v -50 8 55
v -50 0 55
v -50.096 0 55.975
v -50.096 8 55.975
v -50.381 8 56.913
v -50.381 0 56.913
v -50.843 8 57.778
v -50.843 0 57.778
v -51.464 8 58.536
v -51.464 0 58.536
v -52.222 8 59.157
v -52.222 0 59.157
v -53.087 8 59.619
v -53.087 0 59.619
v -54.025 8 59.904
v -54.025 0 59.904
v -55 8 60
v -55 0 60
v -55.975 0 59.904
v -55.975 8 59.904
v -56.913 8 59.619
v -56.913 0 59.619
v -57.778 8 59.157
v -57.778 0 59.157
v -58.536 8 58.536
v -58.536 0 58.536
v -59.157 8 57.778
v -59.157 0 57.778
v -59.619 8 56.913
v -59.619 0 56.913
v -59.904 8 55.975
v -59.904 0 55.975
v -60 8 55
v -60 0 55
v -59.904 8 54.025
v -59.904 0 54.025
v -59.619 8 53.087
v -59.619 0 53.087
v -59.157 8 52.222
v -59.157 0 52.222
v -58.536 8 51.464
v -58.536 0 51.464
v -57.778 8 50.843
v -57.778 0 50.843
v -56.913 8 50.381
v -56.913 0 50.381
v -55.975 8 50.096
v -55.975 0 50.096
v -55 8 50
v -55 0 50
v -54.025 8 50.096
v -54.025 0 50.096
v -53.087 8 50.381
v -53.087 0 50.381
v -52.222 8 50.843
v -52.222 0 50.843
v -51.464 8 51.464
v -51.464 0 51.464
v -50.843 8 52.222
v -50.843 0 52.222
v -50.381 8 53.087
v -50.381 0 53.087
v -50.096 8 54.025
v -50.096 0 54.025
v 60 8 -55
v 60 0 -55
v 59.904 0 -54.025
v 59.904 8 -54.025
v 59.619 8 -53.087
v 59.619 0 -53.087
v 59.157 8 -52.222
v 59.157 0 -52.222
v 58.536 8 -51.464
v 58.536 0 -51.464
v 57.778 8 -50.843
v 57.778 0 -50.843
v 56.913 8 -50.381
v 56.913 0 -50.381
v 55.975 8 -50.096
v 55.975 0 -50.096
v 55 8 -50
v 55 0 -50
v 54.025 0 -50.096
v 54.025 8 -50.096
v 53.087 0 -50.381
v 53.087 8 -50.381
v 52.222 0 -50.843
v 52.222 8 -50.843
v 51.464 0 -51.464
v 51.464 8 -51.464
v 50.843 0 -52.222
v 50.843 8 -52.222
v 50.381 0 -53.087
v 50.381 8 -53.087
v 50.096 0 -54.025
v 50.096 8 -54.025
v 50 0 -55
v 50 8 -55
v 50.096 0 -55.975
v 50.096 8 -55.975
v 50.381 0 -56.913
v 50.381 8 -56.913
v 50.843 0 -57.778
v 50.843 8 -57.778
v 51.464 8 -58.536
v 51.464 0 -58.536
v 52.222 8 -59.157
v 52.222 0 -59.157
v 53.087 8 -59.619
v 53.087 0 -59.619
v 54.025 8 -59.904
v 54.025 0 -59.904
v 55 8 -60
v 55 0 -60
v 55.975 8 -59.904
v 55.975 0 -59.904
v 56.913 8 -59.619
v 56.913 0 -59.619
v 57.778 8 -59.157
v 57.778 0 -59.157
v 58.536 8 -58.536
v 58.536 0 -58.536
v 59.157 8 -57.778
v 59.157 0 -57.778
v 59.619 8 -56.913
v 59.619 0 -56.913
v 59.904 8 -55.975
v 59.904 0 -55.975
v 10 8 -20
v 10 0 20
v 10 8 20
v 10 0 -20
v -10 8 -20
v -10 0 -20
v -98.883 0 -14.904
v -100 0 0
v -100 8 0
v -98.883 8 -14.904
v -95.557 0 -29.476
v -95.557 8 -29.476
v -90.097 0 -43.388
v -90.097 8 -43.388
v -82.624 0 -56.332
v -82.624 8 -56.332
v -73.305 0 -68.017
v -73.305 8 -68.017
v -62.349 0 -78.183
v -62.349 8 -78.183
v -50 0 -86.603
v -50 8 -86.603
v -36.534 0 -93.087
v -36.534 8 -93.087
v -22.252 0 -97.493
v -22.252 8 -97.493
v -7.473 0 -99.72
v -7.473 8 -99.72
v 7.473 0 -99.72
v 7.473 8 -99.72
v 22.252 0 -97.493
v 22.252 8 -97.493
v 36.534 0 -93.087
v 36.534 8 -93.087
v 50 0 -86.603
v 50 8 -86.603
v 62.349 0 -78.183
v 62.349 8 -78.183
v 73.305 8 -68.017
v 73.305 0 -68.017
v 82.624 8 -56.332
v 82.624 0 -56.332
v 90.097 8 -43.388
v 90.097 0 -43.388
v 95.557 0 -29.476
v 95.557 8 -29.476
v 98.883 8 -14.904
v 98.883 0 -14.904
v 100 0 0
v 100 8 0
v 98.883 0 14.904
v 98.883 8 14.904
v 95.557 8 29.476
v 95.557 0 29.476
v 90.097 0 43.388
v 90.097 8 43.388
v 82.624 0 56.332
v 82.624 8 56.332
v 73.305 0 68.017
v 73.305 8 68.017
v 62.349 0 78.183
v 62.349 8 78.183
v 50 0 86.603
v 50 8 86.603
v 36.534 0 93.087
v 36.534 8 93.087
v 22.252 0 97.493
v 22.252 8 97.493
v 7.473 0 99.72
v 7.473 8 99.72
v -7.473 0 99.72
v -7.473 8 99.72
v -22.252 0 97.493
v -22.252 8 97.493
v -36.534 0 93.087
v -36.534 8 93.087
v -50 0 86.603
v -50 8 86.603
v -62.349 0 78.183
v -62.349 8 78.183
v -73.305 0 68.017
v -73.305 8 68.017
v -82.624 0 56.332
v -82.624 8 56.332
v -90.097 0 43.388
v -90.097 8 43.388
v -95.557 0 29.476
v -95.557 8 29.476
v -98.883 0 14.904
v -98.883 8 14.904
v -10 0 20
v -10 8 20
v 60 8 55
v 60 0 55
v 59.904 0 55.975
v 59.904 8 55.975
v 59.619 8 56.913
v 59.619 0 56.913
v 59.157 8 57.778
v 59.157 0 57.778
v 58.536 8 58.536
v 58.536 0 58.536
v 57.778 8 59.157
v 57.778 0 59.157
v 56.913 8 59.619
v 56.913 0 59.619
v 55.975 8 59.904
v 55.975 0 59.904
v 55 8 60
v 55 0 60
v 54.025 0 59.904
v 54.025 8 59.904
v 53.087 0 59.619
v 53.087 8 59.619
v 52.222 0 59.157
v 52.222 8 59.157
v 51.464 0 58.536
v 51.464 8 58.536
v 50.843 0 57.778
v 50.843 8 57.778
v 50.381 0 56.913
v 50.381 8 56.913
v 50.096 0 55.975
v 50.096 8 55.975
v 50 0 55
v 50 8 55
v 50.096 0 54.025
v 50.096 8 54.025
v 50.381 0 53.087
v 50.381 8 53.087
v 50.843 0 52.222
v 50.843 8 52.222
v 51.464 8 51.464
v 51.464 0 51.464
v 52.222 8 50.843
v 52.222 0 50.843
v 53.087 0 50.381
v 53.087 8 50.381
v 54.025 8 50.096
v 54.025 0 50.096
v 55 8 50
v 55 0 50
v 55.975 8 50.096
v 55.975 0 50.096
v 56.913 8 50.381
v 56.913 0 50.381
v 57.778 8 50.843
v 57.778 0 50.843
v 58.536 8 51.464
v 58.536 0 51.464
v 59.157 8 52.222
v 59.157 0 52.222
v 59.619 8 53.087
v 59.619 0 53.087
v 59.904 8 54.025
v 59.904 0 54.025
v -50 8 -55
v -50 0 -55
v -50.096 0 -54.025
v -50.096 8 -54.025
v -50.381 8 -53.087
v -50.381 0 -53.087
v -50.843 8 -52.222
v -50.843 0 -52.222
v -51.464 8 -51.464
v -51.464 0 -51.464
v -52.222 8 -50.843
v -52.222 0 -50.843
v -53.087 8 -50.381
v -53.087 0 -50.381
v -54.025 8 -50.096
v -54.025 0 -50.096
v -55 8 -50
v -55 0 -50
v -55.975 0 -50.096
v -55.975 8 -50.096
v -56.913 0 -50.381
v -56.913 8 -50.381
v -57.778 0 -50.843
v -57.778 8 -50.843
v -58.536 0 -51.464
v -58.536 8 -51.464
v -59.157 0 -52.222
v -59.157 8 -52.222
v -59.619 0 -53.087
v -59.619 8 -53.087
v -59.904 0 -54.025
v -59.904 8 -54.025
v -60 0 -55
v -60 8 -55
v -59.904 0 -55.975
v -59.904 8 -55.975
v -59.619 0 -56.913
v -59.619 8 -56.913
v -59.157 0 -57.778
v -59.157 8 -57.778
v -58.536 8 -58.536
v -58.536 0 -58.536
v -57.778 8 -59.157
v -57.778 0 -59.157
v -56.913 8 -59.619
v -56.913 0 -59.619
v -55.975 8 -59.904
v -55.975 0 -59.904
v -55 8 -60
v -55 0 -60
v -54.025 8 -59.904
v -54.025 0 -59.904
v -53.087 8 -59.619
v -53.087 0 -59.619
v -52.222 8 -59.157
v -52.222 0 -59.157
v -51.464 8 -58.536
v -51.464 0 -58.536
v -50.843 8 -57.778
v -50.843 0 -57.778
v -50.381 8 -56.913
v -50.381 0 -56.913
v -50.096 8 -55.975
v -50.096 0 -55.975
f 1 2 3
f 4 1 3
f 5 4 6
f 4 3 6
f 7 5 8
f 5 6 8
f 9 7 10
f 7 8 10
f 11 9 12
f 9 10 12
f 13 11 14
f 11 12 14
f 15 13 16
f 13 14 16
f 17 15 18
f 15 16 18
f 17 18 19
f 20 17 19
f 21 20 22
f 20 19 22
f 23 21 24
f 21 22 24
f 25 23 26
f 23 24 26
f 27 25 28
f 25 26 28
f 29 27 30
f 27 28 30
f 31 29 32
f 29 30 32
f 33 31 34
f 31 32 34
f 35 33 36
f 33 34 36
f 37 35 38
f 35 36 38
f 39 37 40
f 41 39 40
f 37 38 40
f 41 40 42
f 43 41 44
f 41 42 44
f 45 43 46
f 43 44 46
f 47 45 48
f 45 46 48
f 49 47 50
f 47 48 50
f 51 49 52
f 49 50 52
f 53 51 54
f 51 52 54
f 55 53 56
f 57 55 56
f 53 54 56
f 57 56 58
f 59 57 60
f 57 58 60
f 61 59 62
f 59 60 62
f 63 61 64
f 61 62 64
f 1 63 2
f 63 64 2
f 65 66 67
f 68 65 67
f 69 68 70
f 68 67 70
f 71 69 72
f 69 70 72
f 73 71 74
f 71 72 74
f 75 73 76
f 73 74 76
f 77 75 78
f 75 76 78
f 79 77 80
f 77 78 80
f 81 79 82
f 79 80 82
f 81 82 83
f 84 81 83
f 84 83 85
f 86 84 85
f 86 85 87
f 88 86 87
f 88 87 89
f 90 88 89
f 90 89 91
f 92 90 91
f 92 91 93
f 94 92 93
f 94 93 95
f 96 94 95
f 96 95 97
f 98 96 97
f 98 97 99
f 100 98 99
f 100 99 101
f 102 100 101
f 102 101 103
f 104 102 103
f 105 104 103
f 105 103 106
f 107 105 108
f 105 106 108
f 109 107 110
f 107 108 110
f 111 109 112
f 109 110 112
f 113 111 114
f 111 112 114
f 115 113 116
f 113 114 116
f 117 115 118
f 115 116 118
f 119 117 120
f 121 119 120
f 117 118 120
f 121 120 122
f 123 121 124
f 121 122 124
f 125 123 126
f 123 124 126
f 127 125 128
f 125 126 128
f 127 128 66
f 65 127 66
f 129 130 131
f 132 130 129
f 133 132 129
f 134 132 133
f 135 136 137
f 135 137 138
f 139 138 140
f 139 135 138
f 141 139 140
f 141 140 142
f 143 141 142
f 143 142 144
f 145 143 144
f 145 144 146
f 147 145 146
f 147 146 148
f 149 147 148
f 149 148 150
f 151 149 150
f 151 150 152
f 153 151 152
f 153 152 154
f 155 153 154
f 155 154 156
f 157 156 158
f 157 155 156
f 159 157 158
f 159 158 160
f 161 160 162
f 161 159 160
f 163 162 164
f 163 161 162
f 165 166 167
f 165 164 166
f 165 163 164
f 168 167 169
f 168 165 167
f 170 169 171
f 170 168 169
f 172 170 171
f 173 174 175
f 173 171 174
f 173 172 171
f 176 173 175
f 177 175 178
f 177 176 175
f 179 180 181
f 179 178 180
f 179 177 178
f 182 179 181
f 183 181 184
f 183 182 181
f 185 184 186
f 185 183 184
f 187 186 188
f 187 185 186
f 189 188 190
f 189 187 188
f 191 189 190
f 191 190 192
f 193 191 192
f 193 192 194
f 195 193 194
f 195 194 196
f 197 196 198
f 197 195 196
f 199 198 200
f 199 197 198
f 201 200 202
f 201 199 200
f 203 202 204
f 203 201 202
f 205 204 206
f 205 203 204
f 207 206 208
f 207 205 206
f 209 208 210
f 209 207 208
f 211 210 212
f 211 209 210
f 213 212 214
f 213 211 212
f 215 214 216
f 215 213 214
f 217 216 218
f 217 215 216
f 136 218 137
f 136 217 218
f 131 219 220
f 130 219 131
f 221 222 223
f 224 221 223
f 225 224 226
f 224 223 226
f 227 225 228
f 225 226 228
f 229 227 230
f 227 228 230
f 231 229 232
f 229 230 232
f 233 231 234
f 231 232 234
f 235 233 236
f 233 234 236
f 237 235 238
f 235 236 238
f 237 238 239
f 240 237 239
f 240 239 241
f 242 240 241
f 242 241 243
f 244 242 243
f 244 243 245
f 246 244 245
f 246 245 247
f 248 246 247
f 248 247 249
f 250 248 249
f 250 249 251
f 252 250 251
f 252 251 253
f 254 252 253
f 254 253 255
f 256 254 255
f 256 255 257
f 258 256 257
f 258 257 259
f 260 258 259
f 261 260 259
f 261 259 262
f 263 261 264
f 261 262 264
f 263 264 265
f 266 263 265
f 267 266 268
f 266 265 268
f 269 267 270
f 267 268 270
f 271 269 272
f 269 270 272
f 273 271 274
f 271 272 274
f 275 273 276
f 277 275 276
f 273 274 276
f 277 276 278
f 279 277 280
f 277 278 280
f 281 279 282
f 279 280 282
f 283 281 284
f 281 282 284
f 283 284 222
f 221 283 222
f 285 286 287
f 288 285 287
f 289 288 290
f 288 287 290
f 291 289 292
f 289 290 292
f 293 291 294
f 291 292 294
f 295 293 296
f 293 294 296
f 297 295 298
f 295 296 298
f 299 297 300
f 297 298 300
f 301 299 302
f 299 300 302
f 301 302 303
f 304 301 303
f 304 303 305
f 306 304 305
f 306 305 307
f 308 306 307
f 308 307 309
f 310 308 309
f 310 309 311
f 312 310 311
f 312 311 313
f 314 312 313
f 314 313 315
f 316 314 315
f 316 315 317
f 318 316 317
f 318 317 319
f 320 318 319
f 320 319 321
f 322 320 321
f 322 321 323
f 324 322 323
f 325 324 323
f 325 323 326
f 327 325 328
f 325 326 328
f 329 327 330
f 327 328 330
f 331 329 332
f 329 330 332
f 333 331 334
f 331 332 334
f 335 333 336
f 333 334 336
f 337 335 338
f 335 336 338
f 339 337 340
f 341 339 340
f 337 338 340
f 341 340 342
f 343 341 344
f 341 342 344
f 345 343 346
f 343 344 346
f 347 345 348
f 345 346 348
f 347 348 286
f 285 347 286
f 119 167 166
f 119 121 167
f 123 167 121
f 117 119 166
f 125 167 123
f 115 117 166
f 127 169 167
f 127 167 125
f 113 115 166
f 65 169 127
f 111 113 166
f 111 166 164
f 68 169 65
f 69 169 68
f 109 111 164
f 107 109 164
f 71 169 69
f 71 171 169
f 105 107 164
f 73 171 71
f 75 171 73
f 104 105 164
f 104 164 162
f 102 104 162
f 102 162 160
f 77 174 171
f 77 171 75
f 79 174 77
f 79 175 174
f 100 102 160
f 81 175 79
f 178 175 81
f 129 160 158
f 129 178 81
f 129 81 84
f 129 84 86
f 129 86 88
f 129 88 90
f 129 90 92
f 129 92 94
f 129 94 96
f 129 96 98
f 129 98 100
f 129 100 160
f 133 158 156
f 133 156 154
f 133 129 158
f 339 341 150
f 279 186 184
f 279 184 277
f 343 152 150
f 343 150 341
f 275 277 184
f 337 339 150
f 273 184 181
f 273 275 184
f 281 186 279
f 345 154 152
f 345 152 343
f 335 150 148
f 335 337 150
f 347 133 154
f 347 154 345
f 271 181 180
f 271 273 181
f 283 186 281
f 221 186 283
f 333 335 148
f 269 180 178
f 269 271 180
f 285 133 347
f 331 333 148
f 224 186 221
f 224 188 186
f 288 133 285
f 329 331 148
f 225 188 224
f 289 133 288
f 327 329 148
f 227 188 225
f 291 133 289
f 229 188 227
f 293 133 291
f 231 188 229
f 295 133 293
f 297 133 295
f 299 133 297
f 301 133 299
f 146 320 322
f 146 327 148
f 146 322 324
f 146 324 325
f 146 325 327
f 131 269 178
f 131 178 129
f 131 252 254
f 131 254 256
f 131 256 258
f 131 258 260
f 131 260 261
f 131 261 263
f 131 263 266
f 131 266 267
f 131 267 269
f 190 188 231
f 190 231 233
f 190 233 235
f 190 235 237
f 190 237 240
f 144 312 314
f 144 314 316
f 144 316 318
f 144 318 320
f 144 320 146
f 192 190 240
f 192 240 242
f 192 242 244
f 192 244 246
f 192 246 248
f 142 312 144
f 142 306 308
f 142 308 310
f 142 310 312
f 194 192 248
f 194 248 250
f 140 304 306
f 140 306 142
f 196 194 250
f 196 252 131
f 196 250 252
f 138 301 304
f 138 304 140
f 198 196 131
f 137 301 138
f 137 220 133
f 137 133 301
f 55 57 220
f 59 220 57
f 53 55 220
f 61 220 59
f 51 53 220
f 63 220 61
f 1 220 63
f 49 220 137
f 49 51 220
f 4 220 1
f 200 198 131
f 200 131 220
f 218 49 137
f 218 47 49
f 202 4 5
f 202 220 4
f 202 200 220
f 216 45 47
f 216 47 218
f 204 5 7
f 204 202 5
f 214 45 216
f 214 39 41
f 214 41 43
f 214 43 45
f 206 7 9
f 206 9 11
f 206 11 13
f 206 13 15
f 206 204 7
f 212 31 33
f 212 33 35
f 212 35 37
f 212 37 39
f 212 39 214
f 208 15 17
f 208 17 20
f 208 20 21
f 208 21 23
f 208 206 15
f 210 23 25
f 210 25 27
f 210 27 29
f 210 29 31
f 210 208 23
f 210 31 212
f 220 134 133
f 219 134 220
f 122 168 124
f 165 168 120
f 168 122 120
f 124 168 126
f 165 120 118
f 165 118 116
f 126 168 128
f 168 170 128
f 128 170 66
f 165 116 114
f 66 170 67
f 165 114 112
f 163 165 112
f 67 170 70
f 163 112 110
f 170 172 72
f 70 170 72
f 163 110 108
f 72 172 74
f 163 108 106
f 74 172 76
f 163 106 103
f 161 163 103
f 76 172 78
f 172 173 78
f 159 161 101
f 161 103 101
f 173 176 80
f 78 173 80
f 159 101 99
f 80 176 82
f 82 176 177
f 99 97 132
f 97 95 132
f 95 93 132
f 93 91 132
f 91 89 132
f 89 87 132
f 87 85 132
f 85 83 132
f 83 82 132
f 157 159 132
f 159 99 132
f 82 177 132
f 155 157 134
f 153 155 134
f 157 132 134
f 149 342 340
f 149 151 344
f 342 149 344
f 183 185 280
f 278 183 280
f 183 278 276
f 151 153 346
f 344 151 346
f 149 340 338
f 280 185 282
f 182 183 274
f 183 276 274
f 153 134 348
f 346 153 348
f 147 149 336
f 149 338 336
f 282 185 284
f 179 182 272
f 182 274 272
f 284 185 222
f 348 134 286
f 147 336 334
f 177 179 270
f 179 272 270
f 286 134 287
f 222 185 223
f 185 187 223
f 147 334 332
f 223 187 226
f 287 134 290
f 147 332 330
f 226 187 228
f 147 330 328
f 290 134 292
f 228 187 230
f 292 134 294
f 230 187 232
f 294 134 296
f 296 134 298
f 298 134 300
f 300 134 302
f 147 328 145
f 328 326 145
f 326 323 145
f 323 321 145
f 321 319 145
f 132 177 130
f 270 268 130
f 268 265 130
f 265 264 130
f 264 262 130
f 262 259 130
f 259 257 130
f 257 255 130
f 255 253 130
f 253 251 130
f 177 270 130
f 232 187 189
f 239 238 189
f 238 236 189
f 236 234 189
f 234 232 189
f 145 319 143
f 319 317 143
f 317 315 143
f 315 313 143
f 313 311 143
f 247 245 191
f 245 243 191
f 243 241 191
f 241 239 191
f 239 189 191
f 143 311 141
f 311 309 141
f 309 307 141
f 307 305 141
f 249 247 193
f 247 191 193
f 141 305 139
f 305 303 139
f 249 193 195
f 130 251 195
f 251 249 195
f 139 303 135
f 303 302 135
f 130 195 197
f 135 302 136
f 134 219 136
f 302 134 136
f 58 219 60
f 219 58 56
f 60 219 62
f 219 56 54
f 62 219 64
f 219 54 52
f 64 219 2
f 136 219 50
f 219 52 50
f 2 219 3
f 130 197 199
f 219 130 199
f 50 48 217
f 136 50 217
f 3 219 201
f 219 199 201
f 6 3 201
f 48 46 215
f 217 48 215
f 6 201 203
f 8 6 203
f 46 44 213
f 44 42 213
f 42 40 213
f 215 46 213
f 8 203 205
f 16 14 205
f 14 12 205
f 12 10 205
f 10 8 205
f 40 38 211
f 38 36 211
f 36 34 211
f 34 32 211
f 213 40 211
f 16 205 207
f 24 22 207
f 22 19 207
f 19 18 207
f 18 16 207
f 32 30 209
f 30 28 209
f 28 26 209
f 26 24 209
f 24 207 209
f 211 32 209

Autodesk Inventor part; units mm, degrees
ref_plane "YZ Plane" through (0, 0, 0) normal (1, 0, 0) x (0, 1, 0)
ref_plane "XZ Plane" through (0, 0, 0) normal (0, 1, 0) x (-1, 0, 0)
ref_plane "XY Plane" through (0, 0, 0) normal (0, 0, 1) x (1, 0, 0)
sketch "Esquisse1" plane through (0, 0, 0) normal (0, 1, 0) x (-1, 0, 0)
  circle A0 centre (0, 0) radius 100
  line L0 (-10, -20) -> (10, -20)
  line L1 (10, -20) -> (10, 20)
  line L2 (10, 20) -> (-10, 20)
  line L3 (-10, 20) -> (-10, -20)
  line L4 (-10, -20) -> (10, 20) construction
  line L5 (10, -20) -> (-10, 20) construction
  dimension "d0" = 200
  dimension "d3" = 20
  dimension "d4" = 40
extrude "Extrusion2" add sketch "Esquisse1" along normal blind 8
sketch "Esquisse2" plane through (0, 0, 0) normal (0, -1, 0) x (1, 0, 0)
  line L0 (-55, -55) -> (55, -55)
  line L1 (55, -55) -> (55, 55)
  line L2 (55, 55) -> (-55, 55)
  line L3 (-55, 55) -> (-55, -55)
  line L4 (-55, -55) -> (55, 55) construction
  line L5 (55, -55) -> (-55, 55) construction
  circle A0 centre (-55, 55) radius 5
  circle A1 centre (55, 55) radius 5
  circle A2 centre (55, -55) radius 5
  circle A3 centre (-55, -55) radius 5
  point P0 (0, 0)
  dimension "d7" = 110
  dimension "d8" = 10
extrude "Extrusion3" cut sketch "Esquisse2" against normal blind 8 contours L3 A3 L0 | L0 A3 L3 | A2 L1 L0 | L0 L1 A2 | A0 L2 L3 | L3 L2 A0 | A1 L2 L1 | L1 L2 A1
properties part number "dessus" material "Bois (bouleau)"
